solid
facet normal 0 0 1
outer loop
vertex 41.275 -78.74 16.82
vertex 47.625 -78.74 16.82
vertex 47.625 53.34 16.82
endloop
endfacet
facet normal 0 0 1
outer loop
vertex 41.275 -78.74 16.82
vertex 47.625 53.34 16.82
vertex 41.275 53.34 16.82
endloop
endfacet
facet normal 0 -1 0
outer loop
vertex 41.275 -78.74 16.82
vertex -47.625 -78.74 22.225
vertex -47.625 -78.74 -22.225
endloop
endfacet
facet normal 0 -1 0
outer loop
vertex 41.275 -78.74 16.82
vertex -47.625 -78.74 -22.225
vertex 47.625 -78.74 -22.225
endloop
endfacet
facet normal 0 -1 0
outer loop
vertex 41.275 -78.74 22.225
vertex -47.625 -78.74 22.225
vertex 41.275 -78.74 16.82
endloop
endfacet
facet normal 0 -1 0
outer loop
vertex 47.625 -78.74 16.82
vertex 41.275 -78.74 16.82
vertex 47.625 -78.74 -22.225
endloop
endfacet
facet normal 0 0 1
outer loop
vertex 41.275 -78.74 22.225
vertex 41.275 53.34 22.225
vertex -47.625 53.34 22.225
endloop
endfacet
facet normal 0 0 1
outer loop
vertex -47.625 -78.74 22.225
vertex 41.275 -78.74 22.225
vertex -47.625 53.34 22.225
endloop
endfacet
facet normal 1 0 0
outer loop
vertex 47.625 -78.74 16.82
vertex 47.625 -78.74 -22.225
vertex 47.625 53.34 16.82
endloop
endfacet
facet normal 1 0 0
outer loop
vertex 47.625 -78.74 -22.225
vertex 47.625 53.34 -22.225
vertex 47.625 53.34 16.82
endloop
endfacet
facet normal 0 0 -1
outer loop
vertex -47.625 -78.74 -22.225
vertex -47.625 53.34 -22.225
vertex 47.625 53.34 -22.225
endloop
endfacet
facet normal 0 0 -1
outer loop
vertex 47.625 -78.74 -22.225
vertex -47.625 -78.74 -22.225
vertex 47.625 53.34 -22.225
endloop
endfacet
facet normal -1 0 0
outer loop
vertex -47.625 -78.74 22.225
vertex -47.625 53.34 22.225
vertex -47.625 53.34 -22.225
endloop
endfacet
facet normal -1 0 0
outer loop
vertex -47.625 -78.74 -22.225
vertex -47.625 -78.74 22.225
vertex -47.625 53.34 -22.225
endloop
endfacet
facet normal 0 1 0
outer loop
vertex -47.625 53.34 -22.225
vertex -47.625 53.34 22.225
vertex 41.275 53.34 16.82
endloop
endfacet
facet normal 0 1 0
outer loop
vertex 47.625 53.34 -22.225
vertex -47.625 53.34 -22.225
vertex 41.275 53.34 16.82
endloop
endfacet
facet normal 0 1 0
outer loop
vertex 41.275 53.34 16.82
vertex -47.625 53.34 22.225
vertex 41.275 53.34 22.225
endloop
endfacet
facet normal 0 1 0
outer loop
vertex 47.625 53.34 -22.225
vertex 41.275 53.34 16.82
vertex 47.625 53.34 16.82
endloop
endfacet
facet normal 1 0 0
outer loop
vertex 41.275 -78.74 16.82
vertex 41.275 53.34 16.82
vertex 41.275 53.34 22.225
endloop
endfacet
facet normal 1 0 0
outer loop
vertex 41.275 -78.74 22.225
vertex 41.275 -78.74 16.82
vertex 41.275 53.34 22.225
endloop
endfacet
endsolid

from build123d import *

# Parameters (mm, degrees)
F1_DEPTH  = 53.34
F2_DEPTH  = 25.4
F2_FACE_W = 88.9
F2_FACE_H = 132.08
F3_DEPTH  = 3.048


with BuildPart() as f1:
    # F0 (on Front) → F1 (new body, symmetric)
    with BuildSketch(Plane.XZ):
        Polygon((-47.625, -22.225), (47.625, -22.225), (47.625, 16.819645), (41.275, 16.819645), (41.275, 22.225), (-47.625, 22.225), align=None)
    extrude(amount=F1_DEPTH, both=True)

    # F1_face (on face) → F2 (join)
    with BuildSketch(Plane(origin=(-0.363302, -53.34, -0.159561), x_dir=(1, 0, 0), z_dir=(0, -1, 0))):
        Polygon((-47.261698, -22.065439), (47.988302, -22.065439), (47.988302, 16.979206), (41.638302, 16.979206), (41.638302, 22.384561), (-47.261698, 22.384561), align=None)
    extrude(amount=F2_DEPTH)

    # F2_face (on face) → F3 (join)
    with BuildSketch(Plane(origin=(-3.175, -12.7, 22.225), x_dir=(1, 0, 0), z_dir=(0, 0, 1))):
        Rectangle(F2_FACE_W, F2_FACE_H)
    extrude(amount=-F3_DEPTH)


solid = f1.part
